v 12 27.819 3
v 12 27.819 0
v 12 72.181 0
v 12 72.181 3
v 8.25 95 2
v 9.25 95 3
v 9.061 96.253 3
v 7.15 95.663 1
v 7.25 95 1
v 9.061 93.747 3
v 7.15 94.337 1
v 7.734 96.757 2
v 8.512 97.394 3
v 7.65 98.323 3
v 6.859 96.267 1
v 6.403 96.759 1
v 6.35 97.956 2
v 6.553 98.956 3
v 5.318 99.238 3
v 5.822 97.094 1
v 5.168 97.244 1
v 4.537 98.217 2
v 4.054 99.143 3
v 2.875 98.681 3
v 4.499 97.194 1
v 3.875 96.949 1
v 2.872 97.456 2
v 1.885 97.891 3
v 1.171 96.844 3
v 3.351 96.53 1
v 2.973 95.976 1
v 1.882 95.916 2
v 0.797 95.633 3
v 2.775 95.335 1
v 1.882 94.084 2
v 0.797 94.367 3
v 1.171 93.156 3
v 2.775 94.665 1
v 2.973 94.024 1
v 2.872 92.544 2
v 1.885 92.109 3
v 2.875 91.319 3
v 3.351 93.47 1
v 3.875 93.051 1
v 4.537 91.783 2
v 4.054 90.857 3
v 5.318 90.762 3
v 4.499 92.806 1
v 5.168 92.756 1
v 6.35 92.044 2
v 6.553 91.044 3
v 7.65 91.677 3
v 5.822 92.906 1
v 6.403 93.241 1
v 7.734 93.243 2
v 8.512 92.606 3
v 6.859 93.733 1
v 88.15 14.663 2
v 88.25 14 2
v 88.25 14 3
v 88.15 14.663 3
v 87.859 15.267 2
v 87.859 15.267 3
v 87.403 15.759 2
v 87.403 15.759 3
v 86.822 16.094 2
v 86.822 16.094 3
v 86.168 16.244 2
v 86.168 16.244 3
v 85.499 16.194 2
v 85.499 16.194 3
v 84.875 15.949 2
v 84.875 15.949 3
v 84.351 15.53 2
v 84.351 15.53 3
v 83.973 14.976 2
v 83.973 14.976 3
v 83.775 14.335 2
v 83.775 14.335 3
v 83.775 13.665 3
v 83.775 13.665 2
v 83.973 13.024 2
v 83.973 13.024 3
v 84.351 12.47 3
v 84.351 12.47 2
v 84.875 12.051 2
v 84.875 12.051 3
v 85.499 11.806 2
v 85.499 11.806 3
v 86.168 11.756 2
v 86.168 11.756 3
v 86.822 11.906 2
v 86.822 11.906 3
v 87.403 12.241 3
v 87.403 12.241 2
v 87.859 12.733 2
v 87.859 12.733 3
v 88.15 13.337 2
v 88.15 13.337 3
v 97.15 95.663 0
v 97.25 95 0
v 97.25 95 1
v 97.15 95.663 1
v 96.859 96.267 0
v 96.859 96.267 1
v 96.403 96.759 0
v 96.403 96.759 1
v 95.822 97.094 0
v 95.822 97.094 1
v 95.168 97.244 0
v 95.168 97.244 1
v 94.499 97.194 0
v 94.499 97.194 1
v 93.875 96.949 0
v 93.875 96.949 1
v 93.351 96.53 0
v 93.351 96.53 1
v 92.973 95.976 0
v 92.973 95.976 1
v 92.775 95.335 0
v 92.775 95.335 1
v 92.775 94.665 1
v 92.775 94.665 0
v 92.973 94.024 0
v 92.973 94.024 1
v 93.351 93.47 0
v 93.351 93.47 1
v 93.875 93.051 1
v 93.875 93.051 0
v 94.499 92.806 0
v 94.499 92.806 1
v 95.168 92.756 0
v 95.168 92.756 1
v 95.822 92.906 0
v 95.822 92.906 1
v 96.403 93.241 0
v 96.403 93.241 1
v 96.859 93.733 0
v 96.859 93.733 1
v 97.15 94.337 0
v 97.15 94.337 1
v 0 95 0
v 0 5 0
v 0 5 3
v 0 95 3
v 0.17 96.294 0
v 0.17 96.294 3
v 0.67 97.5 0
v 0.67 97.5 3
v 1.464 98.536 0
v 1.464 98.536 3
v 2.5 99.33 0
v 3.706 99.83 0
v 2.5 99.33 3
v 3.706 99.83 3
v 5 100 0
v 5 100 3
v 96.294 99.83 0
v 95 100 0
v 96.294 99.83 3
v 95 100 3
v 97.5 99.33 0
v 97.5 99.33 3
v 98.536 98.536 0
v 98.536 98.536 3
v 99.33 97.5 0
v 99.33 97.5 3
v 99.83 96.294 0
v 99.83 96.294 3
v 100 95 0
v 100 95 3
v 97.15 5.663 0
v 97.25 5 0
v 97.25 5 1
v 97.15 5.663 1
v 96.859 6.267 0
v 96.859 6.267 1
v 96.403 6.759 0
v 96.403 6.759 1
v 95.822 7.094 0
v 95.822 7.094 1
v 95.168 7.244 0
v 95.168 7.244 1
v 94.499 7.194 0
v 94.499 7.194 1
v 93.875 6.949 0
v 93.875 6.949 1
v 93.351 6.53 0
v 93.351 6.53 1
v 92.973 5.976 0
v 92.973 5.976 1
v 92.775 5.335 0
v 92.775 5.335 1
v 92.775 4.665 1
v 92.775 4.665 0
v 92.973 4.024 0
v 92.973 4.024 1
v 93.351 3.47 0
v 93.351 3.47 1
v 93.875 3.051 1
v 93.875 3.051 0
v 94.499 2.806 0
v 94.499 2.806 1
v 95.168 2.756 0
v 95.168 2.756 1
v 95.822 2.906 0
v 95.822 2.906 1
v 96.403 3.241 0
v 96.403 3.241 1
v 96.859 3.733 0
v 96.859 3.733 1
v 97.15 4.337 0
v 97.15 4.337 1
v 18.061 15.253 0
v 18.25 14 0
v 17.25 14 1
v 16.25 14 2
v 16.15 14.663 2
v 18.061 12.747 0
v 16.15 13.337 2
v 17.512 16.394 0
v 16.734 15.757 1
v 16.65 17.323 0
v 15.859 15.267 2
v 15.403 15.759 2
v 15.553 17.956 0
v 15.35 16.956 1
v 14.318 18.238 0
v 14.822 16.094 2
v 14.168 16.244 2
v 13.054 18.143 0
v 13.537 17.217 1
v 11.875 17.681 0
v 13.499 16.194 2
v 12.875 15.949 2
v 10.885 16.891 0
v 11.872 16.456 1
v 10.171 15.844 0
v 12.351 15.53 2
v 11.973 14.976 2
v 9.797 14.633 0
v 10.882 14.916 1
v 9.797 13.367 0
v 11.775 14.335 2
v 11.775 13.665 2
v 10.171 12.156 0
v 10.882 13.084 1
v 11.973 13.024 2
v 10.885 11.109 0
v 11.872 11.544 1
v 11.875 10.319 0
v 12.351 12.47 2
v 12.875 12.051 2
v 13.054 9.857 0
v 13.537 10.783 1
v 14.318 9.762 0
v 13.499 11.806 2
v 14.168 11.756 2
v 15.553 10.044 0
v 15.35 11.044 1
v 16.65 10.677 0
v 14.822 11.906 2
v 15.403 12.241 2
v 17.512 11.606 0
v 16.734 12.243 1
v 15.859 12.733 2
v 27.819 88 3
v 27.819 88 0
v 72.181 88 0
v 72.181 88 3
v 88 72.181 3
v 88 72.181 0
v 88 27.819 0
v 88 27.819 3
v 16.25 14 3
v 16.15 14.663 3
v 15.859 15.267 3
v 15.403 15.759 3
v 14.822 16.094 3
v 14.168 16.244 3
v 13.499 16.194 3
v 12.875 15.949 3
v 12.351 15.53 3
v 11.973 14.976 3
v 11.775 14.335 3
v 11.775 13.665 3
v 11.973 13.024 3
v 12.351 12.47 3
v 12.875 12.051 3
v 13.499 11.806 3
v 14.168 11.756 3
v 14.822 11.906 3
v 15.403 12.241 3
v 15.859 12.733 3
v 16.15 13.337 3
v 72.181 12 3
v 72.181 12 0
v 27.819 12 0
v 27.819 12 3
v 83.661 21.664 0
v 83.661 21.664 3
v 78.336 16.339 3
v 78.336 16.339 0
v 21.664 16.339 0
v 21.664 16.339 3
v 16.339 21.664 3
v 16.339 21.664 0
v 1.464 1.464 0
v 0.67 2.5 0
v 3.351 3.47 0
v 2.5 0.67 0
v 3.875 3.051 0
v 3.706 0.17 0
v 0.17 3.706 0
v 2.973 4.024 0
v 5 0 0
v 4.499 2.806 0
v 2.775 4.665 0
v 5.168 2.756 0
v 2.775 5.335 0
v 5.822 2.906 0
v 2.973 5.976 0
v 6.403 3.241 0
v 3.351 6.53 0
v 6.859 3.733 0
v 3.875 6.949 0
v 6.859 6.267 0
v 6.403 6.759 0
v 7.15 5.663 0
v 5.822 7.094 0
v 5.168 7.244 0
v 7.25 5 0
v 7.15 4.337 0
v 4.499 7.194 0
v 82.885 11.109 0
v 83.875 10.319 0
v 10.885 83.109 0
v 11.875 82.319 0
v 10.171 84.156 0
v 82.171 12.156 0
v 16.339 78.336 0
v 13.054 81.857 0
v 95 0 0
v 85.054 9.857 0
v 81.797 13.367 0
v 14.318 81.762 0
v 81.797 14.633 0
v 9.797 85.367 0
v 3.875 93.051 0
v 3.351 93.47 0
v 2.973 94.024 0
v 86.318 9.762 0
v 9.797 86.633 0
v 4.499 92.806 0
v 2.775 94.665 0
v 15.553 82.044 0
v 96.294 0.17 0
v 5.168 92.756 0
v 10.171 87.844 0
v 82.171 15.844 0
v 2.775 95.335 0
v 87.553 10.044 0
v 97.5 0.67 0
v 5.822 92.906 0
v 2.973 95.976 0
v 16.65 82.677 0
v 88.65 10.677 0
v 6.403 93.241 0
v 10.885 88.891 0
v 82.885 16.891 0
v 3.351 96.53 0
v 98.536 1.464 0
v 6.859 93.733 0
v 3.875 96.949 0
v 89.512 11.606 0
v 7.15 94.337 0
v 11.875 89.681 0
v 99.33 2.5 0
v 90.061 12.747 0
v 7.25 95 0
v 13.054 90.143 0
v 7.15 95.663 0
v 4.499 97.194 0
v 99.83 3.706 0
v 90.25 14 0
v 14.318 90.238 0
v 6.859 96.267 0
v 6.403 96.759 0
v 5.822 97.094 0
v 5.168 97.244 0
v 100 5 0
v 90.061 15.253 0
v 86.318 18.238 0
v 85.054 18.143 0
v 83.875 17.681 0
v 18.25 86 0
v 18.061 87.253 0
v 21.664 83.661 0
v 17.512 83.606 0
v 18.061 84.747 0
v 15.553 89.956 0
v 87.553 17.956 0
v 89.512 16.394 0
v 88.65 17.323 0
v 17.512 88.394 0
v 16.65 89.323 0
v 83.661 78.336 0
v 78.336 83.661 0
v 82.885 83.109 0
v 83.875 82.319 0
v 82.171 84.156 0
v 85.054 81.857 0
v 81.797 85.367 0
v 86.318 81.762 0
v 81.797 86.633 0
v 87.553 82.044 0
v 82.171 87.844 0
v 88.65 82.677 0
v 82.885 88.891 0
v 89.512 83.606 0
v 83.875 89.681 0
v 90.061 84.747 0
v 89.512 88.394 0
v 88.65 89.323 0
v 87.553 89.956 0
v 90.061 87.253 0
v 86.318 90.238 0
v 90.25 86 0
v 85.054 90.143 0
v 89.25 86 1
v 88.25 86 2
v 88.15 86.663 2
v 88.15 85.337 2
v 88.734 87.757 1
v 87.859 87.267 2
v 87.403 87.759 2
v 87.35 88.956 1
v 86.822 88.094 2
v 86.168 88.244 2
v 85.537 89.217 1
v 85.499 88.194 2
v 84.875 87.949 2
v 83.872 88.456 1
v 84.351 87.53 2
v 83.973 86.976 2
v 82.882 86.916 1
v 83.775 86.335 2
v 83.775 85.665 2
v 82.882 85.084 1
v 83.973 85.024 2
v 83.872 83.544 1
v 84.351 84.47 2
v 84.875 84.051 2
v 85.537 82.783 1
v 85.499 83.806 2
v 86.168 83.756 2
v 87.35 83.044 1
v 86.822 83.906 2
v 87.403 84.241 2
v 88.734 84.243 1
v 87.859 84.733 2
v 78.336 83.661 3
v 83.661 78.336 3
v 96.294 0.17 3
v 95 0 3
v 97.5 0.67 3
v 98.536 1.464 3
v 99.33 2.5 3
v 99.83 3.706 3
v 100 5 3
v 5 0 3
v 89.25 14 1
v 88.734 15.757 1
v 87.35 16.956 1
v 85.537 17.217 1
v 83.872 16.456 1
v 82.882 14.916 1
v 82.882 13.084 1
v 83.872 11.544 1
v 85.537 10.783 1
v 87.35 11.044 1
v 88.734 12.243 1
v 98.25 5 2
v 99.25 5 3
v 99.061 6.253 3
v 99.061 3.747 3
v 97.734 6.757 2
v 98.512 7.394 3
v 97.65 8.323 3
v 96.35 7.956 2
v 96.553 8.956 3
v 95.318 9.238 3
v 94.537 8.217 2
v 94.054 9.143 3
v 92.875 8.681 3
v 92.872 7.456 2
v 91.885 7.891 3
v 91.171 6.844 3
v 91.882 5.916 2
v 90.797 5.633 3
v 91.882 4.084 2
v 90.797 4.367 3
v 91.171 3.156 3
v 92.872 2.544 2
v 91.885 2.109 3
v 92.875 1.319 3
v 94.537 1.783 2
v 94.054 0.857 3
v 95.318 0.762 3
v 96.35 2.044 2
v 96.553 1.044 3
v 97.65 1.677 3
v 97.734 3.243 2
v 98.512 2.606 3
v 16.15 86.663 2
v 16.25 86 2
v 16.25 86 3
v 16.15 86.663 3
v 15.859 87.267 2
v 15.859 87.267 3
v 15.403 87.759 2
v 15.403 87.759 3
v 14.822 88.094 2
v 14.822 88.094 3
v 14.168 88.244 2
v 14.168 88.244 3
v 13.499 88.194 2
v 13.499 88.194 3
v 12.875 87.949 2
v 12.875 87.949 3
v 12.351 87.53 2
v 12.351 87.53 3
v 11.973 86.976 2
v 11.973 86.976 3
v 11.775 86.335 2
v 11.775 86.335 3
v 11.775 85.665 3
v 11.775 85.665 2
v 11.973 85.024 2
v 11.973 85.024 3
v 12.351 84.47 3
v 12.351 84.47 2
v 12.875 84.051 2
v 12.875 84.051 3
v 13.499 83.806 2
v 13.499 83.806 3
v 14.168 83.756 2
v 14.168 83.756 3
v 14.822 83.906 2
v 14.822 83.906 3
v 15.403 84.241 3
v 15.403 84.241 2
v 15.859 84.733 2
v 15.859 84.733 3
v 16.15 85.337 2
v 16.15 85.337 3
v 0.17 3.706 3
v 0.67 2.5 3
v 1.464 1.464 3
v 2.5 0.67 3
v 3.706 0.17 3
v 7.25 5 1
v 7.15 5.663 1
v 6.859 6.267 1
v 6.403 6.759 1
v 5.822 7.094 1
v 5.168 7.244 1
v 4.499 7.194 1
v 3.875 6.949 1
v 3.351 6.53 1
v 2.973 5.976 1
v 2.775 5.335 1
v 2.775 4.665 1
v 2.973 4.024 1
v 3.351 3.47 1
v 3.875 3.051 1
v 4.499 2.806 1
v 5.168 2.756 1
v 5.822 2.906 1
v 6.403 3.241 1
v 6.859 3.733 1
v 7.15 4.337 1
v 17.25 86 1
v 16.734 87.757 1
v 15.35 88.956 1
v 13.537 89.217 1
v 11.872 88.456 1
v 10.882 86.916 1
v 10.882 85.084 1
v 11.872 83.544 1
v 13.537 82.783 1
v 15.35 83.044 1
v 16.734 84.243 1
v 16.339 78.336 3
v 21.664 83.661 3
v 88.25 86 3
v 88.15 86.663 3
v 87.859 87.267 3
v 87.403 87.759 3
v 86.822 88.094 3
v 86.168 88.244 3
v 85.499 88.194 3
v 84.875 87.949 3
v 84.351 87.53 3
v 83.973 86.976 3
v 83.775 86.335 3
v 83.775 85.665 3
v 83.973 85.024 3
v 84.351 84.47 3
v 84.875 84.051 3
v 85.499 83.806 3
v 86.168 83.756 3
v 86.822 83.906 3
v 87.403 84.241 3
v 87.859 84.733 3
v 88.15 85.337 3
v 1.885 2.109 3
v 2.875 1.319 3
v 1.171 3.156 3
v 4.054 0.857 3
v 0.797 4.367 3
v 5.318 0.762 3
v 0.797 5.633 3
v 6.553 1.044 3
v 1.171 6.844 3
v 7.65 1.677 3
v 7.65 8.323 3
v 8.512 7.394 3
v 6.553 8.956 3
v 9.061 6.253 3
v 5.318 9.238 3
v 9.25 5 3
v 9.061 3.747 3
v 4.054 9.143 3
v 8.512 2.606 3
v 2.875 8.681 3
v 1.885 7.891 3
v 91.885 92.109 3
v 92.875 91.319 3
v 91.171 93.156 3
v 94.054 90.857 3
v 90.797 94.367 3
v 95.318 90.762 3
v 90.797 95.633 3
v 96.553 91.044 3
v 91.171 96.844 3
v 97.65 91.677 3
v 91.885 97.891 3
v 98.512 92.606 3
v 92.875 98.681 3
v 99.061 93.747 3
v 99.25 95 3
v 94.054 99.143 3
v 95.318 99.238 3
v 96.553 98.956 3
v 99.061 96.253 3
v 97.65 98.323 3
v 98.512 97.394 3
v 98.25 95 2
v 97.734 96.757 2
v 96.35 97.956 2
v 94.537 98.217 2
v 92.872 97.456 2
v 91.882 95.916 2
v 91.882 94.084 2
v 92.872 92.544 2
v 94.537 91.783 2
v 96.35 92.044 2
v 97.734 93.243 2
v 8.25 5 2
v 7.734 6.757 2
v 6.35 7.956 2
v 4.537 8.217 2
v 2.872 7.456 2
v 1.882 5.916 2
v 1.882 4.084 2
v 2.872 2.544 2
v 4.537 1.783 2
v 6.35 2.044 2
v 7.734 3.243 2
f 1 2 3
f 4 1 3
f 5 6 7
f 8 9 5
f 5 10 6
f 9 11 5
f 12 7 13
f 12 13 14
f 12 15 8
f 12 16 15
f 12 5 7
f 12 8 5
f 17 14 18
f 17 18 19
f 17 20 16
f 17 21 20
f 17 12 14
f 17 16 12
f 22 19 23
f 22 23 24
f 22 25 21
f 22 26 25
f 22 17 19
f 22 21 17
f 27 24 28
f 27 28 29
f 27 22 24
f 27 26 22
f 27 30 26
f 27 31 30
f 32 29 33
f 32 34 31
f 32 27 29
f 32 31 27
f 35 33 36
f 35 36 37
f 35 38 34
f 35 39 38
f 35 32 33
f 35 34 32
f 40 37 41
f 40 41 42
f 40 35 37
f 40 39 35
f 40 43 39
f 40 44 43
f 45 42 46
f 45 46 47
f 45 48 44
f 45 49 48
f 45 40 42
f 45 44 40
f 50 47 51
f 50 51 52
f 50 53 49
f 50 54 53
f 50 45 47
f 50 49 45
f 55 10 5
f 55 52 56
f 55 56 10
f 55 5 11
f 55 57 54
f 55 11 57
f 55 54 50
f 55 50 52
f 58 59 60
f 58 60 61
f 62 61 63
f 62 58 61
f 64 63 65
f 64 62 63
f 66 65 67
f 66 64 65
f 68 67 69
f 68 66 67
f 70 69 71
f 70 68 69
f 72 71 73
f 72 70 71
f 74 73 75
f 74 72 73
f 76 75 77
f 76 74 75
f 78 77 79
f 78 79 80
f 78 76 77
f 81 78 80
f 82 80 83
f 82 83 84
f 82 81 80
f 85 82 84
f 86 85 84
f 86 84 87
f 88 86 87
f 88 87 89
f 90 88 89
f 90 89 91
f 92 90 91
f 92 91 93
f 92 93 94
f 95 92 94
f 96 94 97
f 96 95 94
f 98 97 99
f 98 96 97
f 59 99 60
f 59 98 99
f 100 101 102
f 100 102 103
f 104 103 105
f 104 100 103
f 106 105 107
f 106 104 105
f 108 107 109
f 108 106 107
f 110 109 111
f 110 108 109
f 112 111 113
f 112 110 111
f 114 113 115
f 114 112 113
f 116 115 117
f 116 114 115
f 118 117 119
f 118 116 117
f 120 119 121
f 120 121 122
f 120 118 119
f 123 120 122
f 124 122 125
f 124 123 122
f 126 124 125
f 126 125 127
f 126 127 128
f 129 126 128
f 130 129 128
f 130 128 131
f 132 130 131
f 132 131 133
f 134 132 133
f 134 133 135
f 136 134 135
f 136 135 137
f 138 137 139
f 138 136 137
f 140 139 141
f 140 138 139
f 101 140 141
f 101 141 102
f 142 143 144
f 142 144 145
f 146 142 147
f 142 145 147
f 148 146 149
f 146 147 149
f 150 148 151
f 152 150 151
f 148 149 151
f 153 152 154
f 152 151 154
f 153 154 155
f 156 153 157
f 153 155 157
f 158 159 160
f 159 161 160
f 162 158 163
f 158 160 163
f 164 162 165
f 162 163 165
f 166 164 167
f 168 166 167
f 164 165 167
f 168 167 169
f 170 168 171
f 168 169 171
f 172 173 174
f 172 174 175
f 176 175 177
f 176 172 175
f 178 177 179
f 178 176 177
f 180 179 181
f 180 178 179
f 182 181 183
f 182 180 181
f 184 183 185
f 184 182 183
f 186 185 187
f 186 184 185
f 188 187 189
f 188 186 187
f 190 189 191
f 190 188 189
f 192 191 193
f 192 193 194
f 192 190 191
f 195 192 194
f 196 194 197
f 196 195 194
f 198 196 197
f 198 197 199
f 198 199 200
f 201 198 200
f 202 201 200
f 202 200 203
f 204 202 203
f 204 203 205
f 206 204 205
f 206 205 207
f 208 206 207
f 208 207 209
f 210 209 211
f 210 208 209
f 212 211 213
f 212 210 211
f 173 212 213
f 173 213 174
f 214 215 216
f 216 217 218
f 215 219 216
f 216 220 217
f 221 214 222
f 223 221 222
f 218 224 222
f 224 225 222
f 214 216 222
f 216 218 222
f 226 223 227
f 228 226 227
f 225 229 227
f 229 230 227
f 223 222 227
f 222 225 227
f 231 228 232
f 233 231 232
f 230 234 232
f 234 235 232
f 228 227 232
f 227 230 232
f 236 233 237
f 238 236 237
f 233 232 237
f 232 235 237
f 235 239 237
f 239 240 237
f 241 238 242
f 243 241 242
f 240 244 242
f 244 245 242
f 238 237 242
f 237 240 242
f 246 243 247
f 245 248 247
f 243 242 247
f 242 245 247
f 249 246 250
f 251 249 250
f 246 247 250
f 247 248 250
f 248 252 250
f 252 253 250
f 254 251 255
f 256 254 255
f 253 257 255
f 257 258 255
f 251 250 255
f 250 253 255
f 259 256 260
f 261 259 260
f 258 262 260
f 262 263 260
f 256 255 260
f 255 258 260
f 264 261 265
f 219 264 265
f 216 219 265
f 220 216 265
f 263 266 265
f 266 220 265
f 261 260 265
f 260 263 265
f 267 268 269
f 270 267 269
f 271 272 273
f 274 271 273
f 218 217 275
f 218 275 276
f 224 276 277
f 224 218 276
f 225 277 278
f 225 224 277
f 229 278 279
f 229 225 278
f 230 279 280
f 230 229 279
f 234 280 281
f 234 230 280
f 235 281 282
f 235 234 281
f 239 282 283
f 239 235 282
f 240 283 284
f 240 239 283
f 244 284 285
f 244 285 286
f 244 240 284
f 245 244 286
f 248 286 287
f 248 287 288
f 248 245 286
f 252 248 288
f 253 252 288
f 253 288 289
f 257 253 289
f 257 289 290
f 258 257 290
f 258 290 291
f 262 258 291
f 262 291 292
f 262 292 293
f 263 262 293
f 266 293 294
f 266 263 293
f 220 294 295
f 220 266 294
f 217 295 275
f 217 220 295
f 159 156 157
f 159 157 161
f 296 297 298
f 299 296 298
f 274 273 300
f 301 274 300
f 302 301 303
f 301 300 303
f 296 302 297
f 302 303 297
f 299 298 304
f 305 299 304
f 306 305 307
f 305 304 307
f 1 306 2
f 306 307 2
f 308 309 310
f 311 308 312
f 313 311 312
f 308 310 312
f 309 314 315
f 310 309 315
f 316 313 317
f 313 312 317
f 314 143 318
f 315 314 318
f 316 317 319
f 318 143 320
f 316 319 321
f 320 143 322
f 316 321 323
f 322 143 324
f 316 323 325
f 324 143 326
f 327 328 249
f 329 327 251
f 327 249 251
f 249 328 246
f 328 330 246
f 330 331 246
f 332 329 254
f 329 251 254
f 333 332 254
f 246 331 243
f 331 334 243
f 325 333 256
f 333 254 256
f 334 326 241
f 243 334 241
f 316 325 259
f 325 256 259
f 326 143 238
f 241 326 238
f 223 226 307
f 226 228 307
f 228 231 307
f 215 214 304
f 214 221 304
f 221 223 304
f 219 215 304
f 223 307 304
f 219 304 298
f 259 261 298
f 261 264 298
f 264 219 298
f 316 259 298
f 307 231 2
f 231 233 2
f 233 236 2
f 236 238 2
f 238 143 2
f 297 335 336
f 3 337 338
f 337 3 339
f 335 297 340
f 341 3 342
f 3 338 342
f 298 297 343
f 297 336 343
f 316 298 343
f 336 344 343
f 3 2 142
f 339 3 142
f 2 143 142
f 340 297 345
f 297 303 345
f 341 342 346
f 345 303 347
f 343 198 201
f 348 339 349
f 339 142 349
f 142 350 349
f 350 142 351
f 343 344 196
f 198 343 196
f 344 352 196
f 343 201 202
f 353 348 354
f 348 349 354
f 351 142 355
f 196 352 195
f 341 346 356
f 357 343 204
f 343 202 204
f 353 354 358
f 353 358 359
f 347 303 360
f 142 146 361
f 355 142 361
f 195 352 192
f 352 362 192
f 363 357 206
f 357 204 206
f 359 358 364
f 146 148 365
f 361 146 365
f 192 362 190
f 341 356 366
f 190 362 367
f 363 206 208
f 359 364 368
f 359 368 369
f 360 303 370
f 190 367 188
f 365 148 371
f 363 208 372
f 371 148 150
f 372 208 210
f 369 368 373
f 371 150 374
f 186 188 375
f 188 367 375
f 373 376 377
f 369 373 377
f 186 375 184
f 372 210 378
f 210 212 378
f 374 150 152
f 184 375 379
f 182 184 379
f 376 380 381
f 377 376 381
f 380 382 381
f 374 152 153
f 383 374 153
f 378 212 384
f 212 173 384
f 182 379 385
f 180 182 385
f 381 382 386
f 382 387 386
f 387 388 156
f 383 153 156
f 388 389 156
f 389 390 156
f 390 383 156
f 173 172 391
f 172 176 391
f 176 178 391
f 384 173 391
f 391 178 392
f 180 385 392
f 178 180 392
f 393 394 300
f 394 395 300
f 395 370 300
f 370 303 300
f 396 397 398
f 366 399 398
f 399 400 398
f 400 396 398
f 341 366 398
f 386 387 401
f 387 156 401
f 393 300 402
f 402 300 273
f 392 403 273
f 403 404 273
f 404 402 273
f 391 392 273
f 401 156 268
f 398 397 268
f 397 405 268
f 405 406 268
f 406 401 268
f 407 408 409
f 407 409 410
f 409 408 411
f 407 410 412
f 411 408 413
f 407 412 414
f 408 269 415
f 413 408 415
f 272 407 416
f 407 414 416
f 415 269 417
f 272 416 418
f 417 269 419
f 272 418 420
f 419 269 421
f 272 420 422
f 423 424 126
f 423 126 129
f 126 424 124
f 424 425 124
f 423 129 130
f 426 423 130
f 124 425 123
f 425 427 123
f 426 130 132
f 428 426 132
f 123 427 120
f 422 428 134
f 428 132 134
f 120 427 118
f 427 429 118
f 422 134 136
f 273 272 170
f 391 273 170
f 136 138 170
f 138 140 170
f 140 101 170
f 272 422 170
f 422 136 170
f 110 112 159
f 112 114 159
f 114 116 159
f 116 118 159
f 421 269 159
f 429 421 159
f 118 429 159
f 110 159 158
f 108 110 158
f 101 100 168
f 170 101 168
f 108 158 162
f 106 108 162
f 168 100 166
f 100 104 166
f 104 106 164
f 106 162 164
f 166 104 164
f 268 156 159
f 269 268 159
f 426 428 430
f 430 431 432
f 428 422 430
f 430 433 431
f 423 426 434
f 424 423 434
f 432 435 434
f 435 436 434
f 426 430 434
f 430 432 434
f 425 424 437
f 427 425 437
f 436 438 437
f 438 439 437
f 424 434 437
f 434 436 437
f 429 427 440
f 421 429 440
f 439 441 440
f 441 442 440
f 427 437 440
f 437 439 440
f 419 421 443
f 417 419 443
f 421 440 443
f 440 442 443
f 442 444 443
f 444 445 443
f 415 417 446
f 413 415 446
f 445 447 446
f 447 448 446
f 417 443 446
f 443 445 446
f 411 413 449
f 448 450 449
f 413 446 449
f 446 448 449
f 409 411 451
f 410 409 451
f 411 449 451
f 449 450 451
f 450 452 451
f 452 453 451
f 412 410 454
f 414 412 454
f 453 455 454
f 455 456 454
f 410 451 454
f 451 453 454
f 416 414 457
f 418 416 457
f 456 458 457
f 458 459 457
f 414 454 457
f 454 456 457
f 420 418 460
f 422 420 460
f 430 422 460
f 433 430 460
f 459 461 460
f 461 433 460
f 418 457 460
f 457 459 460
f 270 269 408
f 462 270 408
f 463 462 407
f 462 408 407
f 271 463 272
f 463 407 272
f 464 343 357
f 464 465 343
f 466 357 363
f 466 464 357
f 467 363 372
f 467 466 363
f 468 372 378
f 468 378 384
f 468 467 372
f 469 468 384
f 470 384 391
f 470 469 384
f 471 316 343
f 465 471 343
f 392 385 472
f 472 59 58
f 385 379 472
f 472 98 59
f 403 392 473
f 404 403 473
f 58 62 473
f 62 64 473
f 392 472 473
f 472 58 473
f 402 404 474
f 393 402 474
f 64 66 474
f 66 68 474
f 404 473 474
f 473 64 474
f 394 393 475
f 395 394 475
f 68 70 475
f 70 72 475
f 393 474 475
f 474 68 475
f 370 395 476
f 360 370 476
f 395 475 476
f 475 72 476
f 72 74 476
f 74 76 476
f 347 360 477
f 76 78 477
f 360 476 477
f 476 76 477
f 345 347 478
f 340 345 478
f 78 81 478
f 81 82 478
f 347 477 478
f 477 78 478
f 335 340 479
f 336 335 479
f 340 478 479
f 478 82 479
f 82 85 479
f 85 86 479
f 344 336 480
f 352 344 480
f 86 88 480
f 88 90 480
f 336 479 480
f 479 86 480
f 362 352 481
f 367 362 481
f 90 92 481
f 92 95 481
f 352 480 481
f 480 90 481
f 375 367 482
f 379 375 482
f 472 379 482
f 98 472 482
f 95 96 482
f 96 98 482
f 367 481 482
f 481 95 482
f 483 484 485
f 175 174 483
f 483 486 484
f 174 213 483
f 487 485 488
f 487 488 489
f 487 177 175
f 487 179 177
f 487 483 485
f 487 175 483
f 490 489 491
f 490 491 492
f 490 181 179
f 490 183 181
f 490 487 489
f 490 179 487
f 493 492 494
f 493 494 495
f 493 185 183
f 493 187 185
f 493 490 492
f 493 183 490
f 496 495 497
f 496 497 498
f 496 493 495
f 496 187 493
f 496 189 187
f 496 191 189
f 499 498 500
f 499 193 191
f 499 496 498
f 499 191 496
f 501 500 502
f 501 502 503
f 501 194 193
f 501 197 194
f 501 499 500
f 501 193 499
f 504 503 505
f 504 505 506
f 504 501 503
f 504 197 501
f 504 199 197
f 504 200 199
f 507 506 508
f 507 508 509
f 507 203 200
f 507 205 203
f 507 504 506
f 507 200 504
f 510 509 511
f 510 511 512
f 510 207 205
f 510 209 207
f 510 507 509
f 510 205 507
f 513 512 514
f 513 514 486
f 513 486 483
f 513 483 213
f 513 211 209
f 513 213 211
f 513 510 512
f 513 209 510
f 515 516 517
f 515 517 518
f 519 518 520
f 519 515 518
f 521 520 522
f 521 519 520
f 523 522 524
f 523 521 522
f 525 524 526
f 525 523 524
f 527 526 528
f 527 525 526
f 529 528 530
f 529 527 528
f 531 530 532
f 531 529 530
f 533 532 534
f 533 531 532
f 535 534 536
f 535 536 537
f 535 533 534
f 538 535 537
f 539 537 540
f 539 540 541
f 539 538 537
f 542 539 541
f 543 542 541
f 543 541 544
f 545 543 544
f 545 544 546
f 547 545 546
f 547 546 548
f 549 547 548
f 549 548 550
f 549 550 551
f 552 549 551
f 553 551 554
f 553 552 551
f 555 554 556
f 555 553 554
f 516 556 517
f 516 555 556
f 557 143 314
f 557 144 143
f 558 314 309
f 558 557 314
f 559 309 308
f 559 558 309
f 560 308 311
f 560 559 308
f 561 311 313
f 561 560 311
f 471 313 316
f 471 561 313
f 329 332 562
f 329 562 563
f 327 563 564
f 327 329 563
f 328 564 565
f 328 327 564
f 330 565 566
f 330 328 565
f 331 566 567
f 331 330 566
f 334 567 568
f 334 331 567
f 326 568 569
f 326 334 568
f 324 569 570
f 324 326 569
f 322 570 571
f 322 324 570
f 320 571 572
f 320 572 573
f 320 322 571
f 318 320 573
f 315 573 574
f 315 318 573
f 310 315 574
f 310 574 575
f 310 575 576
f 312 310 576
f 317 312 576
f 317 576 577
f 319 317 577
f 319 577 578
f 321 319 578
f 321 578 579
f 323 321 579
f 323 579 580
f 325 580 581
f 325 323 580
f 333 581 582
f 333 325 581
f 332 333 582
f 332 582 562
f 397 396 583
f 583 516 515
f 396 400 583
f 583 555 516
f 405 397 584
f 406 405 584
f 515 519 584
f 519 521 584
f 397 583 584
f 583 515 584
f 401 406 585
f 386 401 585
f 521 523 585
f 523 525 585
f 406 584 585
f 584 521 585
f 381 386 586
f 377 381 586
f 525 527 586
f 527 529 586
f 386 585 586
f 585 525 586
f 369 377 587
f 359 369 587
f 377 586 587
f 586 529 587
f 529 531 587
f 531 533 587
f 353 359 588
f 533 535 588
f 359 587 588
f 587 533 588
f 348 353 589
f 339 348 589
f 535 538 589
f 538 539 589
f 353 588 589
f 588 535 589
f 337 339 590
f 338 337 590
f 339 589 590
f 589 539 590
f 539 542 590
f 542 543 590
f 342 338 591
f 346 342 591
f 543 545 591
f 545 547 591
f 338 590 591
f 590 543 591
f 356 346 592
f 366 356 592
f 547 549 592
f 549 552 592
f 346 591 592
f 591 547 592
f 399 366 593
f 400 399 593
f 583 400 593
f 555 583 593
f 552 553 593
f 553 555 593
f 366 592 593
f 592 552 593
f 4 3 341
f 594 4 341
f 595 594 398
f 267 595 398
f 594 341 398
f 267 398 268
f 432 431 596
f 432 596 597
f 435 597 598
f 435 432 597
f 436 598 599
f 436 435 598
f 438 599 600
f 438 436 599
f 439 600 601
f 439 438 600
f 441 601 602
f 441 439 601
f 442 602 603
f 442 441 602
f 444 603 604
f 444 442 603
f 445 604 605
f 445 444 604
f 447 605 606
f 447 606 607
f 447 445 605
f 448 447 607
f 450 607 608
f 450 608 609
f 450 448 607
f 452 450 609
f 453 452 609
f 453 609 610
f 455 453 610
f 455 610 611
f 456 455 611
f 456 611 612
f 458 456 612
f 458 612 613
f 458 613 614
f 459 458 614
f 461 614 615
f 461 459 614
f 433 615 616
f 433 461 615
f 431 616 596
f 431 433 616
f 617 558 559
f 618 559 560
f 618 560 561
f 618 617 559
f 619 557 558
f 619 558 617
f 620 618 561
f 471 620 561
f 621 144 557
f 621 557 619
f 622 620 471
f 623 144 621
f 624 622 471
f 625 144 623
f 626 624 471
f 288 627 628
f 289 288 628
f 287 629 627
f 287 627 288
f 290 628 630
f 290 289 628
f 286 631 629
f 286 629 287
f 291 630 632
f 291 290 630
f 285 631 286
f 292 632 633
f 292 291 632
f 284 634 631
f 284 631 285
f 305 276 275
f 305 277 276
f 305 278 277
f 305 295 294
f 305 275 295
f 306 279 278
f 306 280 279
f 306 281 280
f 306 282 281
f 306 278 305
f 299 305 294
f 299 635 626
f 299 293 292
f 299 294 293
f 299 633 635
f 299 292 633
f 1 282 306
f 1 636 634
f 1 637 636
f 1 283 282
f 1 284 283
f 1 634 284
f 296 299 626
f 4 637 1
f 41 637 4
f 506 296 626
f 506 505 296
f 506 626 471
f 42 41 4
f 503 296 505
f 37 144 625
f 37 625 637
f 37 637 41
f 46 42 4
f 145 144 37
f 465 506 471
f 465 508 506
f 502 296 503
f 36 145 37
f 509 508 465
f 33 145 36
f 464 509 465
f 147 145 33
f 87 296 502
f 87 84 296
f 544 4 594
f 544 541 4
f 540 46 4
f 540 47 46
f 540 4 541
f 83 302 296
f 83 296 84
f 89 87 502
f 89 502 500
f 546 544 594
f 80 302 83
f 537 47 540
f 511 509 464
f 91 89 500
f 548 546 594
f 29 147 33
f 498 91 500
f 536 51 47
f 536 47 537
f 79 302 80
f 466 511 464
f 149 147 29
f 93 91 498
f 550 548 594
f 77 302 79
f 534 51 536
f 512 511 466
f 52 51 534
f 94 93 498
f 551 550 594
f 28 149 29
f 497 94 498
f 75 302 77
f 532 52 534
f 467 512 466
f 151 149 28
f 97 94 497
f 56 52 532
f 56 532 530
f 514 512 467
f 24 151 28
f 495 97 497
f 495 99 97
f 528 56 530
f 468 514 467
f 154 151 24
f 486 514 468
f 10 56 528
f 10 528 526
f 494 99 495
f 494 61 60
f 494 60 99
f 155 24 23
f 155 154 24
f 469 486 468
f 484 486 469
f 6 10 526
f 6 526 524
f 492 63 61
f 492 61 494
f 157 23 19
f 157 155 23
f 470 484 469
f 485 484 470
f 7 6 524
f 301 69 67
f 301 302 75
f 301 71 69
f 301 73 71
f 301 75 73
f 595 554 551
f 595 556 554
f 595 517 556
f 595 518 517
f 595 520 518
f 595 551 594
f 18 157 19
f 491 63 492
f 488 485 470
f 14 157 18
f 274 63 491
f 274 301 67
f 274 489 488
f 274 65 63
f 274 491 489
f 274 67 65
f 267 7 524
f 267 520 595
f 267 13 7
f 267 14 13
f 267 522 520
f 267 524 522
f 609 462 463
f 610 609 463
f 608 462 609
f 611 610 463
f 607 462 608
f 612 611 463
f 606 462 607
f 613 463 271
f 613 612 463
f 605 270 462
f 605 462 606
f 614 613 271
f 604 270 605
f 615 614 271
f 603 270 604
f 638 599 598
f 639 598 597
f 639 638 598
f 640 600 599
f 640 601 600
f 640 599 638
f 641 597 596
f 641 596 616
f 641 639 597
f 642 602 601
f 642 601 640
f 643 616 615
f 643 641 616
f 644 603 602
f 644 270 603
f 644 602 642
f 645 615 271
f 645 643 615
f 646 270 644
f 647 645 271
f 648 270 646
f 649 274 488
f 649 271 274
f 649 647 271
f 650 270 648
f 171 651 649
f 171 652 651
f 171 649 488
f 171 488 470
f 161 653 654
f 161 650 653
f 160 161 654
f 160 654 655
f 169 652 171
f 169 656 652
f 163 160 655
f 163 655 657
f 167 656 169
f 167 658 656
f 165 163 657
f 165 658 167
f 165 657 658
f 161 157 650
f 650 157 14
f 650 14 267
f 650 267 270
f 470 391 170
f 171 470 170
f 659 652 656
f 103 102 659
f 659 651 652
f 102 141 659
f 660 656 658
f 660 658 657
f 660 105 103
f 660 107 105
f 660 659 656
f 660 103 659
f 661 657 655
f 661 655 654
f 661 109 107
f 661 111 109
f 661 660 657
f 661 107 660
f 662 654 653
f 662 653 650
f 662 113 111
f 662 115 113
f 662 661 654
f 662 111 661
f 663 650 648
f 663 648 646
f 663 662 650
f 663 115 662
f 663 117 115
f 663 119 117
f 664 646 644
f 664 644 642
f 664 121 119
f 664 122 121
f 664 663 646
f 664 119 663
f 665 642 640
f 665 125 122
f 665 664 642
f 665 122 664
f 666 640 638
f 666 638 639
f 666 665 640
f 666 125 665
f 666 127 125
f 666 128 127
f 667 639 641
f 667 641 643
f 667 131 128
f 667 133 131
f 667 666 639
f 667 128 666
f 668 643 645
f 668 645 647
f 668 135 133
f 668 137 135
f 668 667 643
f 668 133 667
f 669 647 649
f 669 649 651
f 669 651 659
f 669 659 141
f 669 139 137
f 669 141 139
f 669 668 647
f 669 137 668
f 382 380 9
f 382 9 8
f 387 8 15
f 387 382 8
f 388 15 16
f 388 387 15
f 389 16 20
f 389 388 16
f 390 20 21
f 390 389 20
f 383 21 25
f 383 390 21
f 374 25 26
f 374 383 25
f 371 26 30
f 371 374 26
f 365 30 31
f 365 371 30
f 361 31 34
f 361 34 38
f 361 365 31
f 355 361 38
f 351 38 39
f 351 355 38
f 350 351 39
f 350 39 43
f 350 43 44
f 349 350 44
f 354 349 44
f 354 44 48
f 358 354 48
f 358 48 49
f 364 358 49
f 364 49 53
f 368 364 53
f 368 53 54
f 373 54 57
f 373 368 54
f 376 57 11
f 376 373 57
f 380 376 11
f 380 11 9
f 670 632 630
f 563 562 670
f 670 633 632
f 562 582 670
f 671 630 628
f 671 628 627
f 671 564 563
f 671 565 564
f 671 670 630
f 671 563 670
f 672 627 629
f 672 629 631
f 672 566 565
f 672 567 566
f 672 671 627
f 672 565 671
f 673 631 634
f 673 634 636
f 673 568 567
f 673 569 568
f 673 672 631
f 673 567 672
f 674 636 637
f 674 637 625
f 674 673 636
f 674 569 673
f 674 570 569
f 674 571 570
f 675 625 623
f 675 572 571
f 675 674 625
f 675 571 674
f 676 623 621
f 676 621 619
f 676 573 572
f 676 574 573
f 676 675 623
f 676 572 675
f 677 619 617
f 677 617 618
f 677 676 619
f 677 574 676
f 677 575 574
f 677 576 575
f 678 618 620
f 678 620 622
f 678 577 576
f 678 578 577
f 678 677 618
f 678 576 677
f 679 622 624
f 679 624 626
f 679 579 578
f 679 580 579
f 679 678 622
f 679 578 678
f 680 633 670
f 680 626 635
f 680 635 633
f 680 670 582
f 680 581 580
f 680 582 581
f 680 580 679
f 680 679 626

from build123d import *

# Parameters (mm, degrees)
F0_W     = 100
F0_H     = 100
F0_R     = 2.25
F1_DEPTH = 3
F2_R     = 5
F3_SIZE  = 2


with BuildPart() as f1:
    # F0 (on Top) → F1 (new body)
    with BuildSketch(Plane.XY):
        with Locations((50, 50)):
            Rectangle(F0_W, F0_H)
        with Locations((5, 5)):
            Circle(F0_R, mode=Mode.SUBTRACT)
        with Locations((14, 14)):
            Circle(F0_R, mode=Mode.SUBTRACT)
        with Locations((95, 5)):
            Circle(F0_R, mode=Mode.SUBTRACT)
        with Locations((86, 14)):
            Circle(F0_R, mode=Mode.SUBTRACT)
        with Locations((14, 86)):
            Circle(F0_R, mode=Mode.SUBTRACT)
        with Locations((5, 95)):
            Circle(F0_R, mode=Mode.SUBTRACT)
        with BuildLine():
            Line((72.181073, 12), (27.818927, 12))
            ThreePointArc((27.818927, 12), (18.887302, 18.887302), (12, 27.818927))
            Line((12, 27.818927), (12, 72.181073))
            ThreePointArc((12, 72.181073), (18.887302, 81.112698), (27.818927, 88))
            Line((27.818927, 88), (72.181073, 88))
            ThreePointArc((72.181073, 88), (81.112698, 81.112698), (88, 72.181073))
            Line((88, 72.181073), (88, 27.818927))
            ThreePointArc((88, 27.818927), (81.112698, 18.887302), (72.181073, 12))
        make_face(mode=Mode.SUBTRACT)
        with Locations((86, 86)):
            Circle(F0_R, mode=Mode.SUBTRACT)
        with Locations((95, 95)):
            Circle(F0_R, mode=Mode.SUBTRACT)
    extrude(amount=F1_DEPTH)

    # F2
    f2_edges = [f1.edges().sort_by_distance(p)[0] for p in [
        (100, 0, 1.5),
        (100, 100, 1.5),
        (0, 0, 1.5),
        (0, 100, 1.5),
    ]]
    fillet(f2_edges, radius=F2_R)

    # F3
    f3_edges = [f1.edges().sort_by_distance(p)[0] for p in [
        (2.75, 95, 3),
        (2.75, 5, 3),
        (92.75, 5, 3),
        (92.75, 95, 3),
        (11.75, 86, 0),
        (11.75, 14, 0),
        (83.75, 14, 0),
        (83.75, 86, 0),
    ]]
    chamfer(f3_edges, length=F3_SIZE)


solid = f1.part
